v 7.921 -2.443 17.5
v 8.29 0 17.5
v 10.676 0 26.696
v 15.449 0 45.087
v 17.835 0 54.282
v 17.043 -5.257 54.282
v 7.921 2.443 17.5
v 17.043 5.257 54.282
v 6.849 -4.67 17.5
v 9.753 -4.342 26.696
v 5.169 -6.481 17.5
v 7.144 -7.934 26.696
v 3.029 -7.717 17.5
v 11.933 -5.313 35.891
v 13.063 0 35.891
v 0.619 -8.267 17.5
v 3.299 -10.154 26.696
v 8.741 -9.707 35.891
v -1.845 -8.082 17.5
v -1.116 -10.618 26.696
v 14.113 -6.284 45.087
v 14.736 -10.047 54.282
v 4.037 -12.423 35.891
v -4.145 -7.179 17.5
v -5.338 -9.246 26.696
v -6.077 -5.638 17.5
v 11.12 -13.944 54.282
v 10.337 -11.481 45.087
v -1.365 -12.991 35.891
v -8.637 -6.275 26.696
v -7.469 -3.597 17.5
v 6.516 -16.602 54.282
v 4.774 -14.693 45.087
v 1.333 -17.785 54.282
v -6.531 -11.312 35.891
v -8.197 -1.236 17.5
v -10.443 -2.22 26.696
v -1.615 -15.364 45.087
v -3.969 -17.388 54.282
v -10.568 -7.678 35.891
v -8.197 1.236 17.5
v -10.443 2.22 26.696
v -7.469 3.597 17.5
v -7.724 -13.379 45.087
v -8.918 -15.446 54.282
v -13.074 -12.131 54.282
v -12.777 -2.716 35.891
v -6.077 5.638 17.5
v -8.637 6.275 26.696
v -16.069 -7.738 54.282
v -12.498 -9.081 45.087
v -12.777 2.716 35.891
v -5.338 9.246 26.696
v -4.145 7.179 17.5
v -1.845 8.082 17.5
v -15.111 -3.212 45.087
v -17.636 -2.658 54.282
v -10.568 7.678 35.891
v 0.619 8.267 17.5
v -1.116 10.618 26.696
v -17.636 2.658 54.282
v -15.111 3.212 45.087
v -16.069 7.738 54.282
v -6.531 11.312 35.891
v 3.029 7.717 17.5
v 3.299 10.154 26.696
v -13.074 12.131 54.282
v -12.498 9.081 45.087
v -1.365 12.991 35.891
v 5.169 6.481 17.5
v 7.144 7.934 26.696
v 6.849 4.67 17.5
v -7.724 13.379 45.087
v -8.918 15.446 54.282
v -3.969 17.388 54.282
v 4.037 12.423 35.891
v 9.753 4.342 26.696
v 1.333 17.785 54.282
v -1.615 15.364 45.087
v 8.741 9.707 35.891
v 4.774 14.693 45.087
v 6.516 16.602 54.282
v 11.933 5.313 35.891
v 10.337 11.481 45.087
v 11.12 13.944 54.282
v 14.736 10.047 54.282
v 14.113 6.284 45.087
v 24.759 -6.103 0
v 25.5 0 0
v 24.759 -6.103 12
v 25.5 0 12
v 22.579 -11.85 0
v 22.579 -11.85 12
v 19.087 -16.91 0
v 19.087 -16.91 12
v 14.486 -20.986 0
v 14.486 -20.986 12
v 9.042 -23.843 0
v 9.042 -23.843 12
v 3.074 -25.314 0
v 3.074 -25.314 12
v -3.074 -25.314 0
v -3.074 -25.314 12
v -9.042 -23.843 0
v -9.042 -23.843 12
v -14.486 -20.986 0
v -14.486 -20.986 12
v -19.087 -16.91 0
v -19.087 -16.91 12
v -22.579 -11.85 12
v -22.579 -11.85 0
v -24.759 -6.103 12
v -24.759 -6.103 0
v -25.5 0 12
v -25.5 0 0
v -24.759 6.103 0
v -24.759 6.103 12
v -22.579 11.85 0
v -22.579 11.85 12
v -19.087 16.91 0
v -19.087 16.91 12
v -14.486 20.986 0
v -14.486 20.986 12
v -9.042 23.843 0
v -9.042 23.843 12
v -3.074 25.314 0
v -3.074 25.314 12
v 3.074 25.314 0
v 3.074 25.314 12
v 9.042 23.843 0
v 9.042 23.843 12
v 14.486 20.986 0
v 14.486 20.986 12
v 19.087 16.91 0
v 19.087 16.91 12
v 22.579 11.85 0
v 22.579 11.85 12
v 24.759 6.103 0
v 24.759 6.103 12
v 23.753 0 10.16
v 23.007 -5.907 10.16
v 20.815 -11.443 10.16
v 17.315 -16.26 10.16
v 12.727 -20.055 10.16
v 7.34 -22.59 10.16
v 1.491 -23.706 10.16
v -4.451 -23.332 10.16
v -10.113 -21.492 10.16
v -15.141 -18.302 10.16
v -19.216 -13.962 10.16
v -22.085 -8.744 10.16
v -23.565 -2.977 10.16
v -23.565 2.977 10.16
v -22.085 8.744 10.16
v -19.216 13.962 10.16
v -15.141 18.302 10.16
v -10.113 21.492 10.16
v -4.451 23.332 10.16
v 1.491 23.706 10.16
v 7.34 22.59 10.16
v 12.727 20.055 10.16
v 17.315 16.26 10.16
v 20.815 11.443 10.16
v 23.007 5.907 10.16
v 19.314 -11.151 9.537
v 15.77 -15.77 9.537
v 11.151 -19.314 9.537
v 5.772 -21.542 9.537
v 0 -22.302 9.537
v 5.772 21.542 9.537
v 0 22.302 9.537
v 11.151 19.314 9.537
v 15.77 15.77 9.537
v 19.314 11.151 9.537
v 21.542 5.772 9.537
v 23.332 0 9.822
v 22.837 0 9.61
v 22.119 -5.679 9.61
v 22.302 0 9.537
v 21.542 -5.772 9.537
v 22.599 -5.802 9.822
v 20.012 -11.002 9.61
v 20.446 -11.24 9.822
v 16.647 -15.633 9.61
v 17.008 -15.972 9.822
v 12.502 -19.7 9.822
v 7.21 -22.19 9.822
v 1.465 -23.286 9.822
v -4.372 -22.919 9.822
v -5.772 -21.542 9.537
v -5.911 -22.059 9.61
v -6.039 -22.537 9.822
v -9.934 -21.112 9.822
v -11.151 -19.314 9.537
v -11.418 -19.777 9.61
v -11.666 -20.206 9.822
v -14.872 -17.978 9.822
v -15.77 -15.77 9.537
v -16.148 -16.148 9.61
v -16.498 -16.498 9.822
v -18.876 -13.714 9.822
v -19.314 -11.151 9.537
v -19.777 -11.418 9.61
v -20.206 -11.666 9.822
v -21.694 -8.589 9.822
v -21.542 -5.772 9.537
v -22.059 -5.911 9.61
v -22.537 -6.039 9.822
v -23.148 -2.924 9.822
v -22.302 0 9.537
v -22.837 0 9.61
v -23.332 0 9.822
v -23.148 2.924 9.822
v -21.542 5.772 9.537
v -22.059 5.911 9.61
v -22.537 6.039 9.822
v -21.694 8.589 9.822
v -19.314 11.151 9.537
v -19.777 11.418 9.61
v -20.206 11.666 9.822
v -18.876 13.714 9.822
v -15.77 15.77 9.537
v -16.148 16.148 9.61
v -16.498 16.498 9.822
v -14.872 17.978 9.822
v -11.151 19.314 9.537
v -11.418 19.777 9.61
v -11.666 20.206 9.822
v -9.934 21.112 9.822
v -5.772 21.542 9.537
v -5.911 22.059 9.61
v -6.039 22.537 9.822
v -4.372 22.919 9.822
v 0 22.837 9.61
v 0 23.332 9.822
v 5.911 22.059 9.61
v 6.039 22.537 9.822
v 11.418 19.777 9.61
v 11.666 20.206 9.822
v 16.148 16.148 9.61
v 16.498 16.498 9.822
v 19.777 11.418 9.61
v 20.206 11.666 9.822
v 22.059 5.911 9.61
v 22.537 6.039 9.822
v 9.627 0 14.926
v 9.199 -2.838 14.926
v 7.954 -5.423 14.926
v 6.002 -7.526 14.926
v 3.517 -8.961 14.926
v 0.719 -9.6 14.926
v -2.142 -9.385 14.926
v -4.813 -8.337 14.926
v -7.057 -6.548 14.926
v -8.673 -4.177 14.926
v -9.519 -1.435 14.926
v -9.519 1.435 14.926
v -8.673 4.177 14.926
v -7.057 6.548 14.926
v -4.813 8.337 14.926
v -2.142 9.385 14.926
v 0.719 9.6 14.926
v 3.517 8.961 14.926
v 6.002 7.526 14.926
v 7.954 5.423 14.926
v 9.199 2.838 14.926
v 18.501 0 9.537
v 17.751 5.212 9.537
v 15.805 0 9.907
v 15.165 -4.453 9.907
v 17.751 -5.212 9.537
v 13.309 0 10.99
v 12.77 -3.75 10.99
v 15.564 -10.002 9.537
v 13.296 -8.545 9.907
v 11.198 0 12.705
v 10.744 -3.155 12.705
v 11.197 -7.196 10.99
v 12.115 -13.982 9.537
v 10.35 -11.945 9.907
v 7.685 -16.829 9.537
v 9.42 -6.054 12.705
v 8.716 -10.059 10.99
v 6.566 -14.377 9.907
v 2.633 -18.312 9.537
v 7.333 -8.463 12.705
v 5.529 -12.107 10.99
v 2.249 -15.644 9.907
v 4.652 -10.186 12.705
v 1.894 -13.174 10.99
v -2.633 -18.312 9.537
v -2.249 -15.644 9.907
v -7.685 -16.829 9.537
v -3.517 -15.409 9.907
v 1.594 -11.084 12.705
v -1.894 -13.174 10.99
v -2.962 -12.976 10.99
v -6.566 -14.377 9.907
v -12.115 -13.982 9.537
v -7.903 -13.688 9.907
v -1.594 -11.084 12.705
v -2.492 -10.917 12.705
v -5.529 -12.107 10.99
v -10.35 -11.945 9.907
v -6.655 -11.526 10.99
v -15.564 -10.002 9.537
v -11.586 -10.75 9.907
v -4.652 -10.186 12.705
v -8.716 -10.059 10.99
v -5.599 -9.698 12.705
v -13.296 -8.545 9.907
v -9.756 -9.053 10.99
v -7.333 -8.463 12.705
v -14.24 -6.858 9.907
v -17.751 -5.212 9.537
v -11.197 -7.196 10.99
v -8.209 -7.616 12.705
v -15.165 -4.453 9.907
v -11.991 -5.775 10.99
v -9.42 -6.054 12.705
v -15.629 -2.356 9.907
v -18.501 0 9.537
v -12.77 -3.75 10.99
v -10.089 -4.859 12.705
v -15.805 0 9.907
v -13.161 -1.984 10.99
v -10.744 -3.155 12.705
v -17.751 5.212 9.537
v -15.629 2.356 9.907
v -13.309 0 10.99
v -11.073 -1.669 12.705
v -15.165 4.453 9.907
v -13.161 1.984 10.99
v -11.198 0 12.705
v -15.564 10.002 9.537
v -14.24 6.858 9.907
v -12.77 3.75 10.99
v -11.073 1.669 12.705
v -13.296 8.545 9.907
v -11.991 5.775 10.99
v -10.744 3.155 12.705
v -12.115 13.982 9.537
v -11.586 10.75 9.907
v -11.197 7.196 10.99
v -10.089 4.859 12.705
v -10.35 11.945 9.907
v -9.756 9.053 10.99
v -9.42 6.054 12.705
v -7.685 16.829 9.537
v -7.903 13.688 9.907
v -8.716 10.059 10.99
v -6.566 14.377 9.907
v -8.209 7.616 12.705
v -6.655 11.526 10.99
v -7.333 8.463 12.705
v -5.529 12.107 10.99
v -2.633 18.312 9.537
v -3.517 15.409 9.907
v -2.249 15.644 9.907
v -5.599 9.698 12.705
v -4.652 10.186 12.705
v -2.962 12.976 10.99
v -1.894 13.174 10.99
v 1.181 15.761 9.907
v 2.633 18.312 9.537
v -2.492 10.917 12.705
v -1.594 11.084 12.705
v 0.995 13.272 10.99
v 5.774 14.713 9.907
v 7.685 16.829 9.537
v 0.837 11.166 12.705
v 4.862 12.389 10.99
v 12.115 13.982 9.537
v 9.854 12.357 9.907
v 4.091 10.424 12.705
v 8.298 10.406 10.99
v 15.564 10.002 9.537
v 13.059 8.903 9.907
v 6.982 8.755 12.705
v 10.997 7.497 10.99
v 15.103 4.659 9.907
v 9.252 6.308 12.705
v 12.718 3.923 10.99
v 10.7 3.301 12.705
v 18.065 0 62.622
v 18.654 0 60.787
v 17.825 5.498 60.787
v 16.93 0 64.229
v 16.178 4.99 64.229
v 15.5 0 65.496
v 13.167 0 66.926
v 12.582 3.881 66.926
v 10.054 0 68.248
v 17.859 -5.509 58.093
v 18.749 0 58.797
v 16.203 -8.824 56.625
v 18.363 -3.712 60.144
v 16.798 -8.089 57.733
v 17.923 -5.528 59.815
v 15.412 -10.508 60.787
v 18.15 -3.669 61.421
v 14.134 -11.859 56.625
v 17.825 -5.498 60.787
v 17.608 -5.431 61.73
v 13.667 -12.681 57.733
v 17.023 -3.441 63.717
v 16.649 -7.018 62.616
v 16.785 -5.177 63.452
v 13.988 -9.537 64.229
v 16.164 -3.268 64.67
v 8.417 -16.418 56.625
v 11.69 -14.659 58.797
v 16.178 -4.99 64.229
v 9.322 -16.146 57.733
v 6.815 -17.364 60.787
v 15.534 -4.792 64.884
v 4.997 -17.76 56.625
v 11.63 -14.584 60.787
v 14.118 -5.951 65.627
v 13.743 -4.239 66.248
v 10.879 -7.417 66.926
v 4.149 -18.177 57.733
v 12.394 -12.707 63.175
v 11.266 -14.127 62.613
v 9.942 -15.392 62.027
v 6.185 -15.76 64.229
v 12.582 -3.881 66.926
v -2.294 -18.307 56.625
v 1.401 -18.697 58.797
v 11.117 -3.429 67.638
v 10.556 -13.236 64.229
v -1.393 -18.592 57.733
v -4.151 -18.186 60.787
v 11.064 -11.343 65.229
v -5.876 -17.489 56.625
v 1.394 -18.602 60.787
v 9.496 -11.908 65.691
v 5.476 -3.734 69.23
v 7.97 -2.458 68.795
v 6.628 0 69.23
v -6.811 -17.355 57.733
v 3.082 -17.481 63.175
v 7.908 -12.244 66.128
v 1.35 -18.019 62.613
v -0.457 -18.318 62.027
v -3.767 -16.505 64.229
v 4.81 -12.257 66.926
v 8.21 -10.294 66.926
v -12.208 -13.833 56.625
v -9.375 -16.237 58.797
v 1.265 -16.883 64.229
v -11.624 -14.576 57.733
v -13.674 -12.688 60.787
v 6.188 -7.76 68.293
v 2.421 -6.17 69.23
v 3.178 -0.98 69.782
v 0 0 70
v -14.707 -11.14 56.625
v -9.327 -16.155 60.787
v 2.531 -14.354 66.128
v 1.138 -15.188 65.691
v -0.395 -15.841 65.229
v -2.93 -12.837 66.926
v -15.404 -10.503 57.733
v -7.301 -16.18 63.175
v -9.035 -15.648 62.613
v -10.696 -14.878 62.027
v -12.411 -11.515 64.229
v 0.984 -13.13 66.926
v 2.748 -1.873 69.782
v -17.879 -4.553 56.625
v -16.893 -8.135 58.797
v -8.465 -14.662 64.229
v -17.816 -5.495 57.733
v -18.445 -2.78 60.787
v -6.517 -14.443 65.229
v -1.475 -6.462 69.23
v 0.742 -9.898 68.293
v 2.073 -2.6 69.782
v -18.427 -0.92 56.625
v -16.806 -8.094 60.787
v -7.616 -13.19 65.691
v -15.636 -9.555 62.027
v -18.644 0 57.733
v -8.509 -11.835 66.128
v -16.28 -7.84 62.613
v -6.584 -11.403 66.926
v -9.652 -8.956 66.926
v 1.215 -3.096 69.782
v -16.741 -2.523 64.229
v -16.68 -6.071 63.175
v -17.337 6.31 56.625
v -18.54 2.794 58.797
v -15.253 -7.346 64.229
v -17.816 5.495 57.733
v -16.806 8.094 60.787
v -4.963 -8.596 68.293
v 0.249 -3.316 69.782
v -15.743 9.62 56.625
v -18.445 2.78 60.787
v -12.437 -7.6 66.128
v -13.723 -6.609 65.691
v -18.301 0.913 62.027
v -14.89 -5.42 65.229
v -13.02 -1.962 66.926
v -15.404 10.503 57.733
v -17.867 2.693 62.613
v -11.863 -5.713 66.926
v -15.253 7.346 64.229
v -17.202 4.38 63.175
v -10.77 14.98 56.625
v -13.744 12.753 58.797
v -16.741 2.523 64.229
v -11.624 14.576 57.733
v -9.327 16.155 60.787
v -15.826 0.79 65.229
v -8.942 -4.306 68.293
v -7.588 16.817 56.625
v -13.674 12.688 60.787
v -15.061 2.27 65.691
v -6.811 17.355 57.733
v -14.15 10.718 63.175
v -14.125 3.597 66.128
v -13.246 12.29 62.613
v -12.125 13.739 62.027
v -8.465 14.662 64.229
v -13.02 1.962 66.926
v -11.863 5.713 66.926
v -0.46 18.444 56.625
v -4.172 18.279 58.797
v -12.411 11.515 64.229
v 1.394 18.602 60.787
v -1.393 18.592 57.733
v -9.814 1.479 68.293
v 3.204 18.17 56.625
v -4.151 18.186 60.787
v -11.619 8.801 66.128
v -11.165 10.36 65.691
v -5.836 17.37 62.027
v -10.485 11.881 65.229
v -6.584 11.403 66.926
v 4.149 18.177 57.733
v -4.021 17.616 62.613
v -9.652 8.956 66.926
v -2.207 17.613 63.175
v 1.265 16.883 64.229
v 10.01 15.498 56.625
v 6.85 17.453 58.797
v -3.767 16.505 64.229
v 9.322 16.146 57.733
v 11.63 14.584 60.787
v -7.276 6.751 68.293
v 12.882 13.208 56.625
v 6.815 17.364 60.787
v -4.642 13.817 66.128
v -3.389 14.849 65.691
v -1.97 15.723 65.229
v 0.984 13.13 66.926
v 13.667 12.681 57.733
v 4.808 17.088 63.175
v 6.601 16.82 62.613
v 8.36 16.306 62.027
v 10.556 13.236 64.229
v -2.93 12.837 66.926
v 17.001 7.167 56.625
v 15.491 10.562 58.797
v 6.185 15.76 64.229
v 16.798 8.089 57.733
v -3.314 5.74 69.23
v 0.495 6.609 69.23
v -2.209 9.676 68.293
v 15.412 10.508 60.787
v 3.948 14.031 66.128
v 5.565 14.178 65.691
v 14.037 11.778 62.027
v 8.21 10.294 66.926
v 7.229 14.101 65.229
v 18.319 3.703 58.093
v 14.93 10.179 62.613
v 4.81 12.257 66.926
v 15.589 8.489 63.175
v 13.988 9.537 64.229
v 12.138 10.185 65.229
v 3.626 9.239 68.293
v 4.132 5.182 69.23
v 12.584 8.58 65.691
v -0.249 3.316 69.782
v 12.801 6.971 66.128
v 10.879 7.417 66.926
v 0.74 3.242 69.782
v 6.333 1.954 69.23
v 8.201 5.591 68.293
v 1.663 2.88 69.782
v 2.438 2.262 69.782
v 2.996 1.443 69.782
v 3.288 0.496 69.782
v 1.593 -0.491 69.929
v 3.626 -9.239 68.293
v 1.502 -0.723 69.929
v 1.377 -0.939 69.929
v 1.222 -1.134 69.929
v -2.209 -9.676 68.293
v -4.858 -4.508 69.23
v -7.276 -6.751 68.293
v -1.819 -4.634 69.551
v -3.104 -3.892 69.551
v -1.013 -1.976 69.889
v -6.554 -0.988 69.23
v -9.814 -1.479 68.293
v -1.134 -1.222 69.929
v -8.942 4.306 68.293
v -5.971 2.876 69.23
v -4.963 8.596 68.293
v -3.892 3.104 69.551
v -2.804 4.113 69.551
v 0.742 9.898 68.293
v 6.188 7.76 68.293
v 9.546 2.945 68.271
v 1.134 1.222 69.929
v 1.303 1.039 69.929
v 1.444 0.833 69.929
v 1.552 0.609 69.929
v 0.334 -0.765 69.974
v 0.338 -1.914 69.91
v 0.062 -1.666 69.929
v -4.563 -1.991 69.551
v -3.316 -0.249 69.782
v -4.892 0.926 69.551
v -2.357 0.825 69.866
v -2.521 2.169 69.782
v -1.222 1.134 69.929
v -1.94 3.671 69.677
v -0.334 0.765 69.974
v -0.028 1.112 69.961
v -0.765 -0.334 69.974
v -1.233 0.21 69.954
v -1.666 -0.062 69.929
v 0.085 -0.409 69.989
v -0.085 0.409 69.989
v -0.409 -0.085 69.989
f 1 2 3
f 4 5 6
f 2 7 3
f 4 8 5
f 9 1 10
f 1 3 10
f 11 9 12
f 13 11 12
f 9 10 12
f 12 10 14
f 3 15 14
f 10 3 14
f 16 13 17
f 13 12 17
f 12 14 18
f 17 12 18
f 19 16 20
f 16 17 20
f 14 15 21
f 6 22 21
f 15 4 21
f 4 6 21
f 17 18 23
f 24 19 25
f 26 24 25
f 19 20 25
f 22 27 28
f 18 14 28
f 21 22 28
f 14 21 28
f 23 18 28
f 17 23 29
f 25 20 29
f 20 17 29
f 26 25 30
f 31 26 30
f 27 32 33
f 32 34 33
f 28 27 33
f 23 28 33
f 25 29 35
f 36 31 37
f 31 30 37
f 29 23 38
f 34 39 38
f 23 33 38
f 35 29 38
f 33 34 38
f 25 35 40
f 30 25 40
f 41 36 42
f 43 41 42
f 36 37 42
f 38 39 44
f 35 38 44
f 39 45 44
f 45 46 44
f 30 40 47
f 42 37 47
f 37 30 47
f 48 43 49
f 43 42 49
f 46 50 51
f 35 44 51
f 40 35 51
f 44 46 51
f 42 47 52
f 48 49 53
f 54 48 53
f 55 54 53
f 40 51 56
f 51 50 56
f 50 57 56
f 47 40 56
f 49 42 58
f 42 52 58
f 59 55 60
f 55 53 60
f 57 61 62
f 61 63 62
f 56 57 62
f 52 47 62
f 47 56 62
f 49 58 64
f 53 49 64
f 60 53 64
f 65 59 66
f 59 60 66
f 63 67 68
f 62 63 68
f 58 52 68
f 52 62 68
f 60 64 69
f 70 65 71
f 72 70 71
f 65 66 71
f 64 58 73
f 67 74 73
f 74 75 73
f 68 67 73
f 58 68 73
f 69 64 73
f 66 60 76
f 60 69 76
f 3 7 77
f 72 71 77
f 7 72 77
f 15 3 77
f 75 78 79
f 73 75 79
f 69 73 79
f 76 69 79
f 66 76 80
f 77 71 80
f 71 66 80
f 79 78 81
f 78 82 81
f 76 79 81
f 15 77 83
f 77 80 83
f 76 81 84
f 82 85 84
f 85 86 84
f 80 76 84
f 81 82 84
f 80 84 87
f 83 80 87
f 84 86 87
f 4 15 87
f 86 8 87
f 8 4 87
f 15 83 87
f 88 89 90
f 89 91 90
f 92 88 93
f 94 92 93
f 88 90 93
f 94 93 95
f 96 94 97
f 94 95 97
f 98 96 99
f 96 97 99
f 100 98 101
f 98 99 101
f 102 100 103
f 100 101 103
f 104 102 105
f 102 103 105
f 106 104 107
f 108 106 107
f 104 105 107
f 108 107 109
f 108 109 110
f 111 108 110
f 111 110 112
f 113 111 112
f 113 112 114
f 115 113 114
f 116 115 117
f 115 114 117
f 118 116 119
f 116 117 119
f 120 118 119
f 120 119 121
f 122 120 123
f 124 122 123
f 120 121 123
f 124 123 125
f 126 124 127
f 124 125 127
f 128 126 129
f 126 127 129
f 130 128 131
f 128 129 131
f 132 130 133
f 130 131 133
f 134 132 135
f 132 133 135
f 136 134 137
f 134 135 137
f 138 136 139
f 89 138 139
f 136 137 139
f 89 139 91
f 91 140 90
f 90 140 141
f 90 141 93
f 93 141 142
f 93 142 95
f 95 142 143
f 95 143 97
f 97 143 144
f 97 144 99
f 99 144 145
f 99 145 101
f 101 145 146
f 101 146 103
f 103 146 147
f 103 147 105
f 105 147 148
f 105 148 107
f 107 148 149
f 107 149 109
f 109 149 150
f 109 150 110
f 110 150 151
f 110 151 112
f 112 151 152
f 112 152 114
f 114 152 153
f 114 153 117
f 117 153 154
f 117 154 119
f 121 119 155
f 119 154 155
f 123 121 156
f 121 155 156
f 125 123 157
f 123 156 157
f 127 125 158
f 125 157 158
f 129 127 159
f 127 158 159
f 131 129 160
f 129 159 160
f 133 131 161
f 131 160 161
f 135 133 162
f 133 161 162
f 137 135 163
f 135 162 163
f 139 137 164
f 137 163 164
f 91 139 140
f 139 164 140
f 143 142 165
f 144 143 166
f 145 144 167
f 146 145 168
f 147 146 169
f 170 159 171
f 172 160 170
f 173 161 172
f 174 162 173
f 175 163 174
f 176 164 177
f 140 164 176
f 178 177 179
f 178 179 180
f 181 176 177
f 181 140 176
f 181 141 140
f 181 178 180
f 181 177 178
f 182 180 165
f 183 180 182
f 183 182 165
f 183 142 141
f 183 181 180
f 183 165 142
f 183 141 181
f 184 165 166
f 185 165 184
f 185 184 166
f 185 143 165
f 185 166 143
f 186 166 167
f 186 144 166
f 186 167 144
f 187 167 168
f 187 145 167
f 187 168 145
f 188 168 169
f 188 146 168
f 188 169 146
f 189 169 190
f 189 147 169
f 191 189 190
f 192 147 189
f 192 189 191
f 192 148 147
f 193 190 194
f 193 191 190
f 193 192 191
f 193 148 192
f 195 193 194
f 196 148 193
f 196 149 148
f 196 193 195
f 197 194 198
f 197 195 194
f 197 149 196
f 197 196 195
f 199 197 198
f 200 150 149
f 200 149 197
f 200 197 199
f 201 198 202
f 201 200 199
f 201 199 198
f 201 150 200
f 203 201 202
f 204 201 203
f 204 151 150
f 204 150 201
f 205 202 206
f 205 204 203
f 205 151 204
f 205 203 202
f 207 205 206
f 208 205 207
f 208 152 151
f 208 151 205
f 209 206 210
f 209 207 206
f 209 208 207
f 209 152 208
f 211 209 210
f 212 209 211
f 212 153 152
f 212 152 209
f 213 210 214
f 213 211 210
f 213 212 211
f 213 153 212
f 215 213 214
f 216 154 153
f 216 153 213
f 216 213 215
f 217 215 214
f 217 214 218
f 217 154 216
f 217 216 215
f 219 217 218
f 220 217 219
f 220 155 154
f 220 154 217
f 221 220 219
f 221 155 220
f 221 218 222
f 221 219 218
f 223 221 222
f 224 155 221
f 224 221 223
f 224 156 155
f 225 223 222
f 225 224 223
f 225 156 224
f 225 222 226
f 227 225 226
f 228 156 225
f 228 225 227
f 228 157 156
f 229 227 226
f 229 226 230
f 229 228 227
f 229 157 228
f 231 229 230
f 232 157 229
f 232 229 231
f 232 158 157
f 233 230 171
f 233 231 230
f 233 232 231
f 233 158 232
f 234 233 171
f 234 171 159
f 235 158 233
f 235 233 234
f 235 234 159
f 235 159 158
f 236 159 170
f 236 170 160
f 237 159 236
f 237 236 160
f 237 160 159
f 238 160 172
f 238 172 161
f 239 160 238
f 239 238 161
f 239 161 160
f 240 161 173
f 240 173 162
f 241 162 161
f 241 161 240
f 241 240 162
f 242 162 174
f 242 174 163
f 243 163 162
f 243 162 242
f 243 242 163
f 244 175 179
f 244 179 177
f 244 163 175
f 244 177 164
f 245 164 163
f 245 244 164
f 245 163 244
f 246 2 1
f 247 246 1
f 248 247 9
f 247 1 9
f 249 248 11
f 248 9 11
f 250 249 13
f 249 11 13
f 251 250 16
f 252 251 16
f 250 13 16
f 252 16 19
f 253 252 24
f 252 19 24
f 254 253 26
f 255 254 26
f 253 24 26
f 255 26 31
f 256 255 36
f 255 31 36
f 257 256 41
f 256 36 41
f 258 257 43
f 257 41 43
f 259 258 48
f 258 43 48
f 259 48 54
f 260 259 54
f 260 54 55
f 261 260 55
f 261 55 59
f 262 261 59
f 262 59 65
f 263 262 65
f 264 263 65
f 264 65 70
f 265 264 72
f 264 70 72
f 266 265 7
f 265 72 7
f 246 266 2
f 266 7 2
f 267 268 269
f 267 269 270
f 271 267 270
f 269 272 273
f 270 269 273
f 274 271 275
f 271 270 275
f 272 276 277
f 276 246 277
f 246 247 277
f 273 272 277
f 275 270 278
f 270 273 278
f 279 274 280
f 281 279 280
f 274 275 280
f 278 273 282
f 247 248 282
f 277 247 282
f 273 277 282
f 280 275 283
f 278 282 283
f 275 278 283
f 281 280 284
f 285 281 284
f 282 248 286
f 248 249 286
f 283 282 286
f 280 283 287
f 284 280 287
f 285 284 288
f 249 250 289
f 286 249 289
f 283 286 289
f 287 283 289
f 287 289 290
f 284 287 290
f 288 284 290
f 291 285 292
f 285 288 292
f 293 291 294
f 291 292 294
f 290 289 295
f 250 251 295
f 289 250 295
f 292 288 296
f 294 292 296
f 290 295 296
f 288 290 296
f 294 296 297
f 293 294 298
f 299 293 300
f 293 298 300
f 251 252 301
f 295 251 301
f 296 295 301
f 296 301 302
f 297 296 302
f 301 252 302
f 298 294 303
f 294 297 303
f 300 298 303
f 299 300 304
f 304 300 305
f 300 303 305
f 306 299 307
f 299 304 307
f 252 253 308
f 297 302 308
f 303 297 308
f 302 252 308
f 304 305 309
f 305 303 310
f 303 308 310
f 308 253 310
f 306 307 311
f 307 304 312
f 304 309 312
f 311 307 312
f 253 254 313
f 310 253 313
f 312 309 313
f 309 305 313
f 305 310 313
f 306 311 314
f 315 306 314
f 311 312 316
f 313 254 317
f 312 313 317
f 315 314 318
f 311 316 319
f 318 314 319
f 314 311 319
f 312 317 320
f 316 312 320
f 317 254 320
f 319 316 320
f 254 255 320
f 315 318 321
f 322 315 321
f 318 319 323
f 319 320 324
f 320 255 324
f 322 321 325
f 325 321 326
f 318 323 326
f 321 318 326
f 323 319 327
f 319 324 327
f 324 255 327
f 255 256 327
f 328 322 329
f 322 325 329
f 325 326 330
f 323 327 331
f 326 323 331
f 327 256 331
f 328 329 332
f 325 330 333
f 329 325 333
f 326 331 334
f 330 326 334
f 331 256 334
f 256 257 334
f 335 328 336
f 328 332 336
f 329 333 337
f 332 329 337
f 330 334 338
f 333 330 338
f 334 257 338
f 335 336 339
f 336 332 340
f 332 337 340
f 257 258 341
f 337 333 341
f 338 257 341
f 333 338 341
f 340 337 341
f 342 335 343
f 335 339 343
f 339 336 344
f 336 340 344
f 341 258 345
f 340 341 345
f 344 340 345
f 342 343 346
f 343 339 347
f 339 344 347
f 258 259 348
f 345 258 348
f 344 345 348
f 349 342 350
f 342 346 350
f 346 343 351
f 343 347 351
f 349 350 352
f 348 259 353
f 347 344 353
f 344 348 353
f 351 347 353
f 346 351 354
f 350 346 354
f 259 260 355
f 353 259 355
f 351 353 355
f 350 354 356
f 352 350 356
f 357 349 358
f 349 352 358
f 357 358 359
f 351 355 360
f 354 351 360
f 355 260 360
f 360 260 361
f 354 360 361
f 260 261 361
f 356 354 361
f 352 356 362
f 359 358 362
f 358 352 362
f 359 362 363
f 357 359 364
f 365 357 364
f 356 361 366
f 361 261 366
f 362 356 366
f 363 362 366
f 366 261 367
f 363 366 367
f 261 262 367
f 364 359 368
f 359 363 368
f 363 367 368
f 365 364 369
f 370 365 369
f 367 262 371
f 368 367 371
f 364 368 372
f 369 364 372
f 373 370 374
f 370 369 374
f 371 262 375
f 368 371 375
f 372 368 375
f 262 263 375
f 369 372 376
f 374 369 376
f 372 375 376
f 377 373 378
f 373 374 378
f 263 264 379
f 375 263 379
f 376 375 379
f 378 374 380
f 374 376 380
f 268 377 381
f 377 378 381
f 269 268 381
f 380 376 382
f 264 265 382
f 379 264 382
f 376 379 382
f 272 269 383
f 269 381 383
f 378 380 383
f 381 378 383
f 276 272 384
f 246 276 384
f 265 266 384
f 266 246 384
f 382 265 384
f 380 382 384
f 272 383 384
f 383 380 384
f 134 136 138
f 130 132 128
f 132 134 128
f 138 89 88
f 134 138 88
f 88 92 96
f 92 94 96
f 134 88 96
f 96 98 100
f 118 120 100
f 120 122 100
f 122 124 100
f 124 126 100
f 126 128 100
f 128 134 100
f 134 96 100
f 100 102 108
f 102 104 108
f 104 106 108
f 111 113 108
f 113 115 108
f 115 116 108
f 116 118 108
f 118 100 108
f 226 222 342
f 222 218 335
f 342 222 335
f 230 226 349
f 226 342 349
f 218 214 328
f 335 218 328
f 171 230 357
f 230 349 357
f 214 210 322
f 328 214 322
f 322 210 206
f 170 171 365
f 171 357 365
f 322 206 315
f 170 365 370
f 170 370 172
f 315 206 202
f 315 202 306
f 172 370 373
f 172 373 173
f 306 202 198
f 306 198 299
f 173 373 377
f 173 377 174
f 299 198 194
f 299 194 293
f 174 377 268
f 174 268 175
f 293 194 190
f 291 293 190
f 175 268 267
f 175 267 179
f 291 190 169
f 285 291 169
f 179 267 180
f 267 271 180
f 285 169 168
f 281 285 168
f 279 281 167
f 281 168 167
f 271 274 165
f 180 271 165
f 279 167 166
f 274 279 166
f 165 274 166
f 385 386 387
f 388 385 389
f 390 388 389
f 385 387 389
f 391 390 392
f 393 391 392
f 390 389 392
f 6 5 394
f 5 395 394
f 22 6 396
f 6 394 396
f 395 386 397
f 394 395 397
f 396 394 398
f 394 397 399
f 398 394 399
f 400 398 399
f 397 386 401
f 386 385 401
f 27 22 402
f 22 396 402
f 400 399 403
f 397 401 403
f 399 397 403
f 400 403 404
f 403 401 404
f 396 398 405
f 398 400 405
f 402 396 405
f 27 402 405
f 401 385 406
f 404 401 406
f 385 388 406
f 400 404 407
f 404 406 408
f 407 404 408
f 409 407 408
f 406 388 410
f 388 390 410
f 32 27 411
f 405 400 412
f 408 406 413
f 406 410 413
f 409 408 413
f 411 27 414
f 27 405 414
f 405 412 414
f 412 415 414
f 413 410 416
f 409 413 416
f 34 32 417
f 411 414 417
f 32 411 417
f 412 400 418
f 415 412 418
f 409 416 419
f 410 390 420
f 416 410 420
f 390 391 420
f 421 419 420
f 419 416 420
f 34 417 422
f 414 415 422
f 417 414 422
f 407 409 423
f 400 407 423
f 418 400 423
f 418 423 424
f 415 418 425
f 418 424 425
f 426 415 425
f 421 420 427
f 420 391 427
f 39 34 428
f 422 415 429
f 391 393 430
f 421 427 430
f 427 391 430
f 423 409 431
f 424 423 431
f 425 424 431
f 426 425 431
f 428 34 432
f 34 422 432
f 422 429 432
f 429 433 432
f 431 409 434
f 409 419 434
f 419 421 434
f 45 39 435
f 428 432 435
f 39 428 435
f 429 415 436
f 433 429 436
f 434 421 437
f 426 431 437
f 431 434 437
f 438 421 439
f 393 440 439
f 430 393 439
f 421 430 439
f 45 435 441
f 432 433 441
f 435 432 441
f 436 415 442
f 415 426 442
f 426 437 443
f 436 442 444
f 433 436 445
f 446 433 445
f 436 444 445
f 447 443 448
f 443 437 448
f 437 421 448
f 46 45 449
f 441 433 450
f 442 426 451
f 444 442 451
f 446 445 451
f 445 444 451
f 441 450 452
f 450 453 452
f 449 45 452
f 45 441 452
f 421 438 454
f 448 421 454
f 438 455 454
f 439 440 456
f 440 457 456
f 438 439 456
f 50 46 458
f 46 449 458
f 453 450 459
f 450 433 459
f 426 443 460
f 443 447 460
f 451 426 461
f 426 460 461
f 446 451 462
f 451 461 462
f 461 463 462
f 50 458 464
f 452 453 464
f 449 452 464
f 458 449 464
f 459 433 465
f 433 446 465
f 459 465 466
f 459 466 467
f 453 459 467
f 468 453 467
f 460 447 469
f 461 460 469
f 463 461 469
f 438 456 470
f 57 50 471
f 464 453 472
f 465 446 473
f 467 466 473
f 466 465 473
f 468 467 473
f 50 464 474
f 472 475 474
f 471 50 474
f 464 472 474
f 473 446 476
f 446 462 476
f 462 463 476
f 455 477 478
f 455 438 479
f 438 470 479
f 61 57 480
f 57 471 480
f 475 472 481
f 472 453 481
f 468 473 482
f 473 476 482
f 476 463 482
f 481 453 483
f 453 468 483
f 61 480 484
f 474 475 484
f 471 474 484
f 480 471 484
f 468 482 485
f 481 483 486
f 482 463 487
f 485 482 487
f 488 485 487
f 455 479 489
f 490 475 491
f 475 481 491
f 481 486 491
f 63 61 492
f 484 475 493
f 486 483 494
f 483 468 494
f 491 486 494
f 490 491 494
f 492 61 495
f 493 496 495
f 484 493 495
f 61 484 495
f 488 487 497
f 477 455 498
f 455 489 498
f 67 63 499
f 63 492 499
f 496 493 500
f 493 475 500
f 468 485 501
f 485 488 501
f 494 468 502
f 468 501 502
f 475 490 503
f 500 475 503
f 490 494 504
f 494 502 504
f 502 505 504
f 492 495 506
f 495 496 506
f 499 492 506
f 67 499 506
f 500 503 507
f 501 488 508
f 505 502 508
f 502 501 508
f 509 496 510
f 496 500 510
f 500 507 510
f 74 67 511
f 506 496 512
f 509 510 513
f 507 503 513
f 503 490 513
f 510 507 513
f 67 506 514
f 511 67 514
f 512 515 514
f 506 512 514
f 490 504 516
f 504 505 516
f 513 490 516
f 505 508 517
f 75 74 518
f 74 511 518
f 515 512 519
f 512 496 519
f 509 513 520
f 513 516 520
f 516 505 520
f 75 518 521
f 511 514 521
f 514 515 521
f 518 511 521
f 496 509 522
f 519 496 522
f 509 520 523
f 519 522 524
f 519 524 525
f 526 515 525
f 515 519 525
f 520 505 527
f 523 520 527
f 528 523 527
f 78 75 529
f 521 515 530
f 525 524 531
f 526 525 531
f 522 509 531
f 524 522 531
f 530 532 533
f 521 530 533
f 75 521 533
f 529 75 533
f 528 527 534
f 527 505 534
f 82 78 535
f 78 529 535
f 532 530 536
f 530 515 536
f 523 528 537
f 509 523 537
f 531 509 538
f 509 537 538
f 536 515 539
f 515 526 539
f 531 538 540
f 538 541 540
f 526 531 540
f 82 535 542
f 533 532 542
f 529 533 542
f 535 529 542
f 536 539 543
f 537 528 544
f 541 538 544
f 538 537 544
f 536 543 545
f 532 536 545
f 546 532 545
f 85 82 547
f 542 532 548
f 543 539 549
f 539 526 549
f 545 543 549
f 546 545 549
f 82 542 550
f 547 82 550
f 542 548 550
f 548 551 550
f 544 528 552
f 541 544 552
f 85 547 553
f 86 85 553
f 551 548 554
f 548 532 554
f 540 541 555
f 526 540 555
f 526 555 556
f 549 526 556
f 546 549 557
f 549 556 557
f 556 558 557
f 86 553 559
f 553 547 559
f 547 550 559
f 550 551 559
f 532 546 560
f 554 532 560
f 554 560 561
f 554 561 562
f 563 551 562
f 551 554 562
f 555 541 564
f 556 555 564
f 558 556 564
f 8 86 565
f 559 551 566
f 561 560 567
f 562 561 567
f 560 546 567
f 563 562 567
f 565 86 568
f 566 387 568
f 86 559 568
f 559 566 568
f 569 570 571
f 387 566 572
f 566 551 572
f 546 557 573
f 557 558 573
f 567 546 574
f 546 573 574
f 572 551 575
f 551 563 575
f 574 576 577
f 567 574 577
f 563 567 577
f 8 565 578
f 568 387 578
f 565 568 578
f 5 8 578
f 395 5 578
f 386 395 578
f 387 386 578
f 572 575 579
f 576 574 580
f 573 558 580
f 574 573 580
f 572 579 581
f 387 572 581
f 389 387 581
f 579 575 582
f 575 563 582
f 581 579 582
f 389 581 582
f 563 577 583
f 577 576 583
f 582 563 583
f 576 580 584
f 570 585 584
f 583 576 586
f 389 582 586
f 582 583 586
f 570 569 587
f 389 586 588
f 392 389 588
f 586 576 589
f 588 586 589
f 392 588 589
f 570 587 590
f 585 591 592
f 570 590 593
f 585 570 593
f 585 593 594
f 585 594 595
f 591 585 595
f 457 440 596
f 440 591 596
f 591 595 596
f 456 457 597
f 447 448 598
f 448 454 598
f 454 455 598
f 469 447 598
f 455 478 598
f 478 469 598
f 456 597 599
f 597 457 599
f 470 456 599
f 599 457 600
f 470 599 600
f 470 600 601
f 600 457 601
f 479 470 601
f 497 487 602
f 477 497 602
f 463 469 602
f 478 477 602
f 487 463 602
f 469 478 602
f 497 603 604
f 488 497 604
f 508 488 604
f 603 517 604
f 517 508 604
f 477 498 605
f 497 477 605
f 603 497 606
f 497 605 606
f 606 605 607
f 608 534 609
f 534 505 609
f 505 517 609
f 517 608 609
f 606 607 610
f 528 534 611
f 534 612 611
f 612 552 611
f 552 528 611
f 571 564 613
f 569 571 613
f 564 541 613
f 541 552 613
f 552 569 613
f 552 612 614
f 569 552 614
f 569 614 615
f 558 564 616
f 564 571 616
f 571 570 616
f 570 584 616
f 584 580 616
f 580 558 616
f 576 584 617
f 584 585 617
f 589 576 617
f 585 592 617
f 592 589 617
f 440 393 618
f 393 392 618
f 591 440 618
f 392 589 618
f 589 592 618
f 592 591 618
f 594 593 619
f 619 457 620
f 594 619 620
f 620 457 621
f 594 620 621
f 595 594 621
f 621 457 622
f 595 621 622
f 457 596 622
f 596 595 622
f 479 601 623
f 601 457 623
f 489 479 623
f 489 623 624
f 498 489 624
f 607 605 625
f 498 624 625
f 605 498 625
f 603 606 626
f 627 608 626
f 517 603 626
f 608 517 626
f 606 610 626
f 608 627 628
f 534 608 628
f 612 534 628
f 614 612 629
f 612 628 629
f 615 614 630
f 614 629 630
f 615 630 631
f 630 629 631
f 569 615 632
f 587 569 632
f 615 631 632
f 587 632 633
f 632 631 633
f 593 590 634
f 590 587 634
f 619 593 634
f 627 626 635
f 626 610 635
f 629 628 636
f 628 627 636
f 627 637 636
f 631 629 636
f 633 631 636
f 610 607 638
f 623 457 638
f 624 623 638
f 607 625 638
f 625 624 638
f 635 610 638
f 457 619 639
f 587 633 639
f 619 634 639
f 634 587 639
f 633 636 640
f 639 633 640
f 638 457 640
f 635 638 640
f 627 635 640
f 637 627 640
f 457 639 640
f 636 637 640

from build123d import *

# Parameters (mm, degrees)
F2_R = 10
F3_R = 2


with BuildPart() as f1:
    # F0 (on Front) → F1 (revolve)
    with BuildSketch(Plane.XZ):
        with BuildLine():
            Line((0, 70), (0, 0))
            Line((0, 0), (25.5, 0))
            Line((25.5, 0), (25.5, 12))
            Line((25.5, 12), (23.161351406, 9.536806494))
            Line((23.161351406, 9.536806494), (12.4268941581, 9.536806494))
            Line((12.4268941581, 9.536806494), (8.2896918707, 17.4999870426))
            Line((8.2896918707, 17.4999870426), (17.8353563403, 54.2824750416))
            add(Edge.make_bspline(
                [(17.8353563403, 54.2824750416), (18.8817362992, 57.6831345085), (19.5978634285, 63.6834766541), (9.8956074759, 68.9451214738), (3.3796710427, 69.9306730781), (0, 70)],
                knots=[0, 0, 0, 0, 0.3192028664, 0.6536802419, 1, 1, 1, 1], degree=3))
        make_face()
    revolve(axis=Axis((0, 0, 35), (0, 0, -1)))

    # F2
    f2_edges = [f1.edges().sort_by_distance(p)[0] for p in [
        (-12.426894, 0, 9.536806),
    ]]
    fillet(f2_edges, radius=F2_R)

    # F3
    f3_edges = [f1.edges().sort_by_distance(p)[0] for p in [
        (-23.161351, 0, 9.536806),
    ]]
    fillet(f3_edges, radius=F3_R)


solid = f1.part
